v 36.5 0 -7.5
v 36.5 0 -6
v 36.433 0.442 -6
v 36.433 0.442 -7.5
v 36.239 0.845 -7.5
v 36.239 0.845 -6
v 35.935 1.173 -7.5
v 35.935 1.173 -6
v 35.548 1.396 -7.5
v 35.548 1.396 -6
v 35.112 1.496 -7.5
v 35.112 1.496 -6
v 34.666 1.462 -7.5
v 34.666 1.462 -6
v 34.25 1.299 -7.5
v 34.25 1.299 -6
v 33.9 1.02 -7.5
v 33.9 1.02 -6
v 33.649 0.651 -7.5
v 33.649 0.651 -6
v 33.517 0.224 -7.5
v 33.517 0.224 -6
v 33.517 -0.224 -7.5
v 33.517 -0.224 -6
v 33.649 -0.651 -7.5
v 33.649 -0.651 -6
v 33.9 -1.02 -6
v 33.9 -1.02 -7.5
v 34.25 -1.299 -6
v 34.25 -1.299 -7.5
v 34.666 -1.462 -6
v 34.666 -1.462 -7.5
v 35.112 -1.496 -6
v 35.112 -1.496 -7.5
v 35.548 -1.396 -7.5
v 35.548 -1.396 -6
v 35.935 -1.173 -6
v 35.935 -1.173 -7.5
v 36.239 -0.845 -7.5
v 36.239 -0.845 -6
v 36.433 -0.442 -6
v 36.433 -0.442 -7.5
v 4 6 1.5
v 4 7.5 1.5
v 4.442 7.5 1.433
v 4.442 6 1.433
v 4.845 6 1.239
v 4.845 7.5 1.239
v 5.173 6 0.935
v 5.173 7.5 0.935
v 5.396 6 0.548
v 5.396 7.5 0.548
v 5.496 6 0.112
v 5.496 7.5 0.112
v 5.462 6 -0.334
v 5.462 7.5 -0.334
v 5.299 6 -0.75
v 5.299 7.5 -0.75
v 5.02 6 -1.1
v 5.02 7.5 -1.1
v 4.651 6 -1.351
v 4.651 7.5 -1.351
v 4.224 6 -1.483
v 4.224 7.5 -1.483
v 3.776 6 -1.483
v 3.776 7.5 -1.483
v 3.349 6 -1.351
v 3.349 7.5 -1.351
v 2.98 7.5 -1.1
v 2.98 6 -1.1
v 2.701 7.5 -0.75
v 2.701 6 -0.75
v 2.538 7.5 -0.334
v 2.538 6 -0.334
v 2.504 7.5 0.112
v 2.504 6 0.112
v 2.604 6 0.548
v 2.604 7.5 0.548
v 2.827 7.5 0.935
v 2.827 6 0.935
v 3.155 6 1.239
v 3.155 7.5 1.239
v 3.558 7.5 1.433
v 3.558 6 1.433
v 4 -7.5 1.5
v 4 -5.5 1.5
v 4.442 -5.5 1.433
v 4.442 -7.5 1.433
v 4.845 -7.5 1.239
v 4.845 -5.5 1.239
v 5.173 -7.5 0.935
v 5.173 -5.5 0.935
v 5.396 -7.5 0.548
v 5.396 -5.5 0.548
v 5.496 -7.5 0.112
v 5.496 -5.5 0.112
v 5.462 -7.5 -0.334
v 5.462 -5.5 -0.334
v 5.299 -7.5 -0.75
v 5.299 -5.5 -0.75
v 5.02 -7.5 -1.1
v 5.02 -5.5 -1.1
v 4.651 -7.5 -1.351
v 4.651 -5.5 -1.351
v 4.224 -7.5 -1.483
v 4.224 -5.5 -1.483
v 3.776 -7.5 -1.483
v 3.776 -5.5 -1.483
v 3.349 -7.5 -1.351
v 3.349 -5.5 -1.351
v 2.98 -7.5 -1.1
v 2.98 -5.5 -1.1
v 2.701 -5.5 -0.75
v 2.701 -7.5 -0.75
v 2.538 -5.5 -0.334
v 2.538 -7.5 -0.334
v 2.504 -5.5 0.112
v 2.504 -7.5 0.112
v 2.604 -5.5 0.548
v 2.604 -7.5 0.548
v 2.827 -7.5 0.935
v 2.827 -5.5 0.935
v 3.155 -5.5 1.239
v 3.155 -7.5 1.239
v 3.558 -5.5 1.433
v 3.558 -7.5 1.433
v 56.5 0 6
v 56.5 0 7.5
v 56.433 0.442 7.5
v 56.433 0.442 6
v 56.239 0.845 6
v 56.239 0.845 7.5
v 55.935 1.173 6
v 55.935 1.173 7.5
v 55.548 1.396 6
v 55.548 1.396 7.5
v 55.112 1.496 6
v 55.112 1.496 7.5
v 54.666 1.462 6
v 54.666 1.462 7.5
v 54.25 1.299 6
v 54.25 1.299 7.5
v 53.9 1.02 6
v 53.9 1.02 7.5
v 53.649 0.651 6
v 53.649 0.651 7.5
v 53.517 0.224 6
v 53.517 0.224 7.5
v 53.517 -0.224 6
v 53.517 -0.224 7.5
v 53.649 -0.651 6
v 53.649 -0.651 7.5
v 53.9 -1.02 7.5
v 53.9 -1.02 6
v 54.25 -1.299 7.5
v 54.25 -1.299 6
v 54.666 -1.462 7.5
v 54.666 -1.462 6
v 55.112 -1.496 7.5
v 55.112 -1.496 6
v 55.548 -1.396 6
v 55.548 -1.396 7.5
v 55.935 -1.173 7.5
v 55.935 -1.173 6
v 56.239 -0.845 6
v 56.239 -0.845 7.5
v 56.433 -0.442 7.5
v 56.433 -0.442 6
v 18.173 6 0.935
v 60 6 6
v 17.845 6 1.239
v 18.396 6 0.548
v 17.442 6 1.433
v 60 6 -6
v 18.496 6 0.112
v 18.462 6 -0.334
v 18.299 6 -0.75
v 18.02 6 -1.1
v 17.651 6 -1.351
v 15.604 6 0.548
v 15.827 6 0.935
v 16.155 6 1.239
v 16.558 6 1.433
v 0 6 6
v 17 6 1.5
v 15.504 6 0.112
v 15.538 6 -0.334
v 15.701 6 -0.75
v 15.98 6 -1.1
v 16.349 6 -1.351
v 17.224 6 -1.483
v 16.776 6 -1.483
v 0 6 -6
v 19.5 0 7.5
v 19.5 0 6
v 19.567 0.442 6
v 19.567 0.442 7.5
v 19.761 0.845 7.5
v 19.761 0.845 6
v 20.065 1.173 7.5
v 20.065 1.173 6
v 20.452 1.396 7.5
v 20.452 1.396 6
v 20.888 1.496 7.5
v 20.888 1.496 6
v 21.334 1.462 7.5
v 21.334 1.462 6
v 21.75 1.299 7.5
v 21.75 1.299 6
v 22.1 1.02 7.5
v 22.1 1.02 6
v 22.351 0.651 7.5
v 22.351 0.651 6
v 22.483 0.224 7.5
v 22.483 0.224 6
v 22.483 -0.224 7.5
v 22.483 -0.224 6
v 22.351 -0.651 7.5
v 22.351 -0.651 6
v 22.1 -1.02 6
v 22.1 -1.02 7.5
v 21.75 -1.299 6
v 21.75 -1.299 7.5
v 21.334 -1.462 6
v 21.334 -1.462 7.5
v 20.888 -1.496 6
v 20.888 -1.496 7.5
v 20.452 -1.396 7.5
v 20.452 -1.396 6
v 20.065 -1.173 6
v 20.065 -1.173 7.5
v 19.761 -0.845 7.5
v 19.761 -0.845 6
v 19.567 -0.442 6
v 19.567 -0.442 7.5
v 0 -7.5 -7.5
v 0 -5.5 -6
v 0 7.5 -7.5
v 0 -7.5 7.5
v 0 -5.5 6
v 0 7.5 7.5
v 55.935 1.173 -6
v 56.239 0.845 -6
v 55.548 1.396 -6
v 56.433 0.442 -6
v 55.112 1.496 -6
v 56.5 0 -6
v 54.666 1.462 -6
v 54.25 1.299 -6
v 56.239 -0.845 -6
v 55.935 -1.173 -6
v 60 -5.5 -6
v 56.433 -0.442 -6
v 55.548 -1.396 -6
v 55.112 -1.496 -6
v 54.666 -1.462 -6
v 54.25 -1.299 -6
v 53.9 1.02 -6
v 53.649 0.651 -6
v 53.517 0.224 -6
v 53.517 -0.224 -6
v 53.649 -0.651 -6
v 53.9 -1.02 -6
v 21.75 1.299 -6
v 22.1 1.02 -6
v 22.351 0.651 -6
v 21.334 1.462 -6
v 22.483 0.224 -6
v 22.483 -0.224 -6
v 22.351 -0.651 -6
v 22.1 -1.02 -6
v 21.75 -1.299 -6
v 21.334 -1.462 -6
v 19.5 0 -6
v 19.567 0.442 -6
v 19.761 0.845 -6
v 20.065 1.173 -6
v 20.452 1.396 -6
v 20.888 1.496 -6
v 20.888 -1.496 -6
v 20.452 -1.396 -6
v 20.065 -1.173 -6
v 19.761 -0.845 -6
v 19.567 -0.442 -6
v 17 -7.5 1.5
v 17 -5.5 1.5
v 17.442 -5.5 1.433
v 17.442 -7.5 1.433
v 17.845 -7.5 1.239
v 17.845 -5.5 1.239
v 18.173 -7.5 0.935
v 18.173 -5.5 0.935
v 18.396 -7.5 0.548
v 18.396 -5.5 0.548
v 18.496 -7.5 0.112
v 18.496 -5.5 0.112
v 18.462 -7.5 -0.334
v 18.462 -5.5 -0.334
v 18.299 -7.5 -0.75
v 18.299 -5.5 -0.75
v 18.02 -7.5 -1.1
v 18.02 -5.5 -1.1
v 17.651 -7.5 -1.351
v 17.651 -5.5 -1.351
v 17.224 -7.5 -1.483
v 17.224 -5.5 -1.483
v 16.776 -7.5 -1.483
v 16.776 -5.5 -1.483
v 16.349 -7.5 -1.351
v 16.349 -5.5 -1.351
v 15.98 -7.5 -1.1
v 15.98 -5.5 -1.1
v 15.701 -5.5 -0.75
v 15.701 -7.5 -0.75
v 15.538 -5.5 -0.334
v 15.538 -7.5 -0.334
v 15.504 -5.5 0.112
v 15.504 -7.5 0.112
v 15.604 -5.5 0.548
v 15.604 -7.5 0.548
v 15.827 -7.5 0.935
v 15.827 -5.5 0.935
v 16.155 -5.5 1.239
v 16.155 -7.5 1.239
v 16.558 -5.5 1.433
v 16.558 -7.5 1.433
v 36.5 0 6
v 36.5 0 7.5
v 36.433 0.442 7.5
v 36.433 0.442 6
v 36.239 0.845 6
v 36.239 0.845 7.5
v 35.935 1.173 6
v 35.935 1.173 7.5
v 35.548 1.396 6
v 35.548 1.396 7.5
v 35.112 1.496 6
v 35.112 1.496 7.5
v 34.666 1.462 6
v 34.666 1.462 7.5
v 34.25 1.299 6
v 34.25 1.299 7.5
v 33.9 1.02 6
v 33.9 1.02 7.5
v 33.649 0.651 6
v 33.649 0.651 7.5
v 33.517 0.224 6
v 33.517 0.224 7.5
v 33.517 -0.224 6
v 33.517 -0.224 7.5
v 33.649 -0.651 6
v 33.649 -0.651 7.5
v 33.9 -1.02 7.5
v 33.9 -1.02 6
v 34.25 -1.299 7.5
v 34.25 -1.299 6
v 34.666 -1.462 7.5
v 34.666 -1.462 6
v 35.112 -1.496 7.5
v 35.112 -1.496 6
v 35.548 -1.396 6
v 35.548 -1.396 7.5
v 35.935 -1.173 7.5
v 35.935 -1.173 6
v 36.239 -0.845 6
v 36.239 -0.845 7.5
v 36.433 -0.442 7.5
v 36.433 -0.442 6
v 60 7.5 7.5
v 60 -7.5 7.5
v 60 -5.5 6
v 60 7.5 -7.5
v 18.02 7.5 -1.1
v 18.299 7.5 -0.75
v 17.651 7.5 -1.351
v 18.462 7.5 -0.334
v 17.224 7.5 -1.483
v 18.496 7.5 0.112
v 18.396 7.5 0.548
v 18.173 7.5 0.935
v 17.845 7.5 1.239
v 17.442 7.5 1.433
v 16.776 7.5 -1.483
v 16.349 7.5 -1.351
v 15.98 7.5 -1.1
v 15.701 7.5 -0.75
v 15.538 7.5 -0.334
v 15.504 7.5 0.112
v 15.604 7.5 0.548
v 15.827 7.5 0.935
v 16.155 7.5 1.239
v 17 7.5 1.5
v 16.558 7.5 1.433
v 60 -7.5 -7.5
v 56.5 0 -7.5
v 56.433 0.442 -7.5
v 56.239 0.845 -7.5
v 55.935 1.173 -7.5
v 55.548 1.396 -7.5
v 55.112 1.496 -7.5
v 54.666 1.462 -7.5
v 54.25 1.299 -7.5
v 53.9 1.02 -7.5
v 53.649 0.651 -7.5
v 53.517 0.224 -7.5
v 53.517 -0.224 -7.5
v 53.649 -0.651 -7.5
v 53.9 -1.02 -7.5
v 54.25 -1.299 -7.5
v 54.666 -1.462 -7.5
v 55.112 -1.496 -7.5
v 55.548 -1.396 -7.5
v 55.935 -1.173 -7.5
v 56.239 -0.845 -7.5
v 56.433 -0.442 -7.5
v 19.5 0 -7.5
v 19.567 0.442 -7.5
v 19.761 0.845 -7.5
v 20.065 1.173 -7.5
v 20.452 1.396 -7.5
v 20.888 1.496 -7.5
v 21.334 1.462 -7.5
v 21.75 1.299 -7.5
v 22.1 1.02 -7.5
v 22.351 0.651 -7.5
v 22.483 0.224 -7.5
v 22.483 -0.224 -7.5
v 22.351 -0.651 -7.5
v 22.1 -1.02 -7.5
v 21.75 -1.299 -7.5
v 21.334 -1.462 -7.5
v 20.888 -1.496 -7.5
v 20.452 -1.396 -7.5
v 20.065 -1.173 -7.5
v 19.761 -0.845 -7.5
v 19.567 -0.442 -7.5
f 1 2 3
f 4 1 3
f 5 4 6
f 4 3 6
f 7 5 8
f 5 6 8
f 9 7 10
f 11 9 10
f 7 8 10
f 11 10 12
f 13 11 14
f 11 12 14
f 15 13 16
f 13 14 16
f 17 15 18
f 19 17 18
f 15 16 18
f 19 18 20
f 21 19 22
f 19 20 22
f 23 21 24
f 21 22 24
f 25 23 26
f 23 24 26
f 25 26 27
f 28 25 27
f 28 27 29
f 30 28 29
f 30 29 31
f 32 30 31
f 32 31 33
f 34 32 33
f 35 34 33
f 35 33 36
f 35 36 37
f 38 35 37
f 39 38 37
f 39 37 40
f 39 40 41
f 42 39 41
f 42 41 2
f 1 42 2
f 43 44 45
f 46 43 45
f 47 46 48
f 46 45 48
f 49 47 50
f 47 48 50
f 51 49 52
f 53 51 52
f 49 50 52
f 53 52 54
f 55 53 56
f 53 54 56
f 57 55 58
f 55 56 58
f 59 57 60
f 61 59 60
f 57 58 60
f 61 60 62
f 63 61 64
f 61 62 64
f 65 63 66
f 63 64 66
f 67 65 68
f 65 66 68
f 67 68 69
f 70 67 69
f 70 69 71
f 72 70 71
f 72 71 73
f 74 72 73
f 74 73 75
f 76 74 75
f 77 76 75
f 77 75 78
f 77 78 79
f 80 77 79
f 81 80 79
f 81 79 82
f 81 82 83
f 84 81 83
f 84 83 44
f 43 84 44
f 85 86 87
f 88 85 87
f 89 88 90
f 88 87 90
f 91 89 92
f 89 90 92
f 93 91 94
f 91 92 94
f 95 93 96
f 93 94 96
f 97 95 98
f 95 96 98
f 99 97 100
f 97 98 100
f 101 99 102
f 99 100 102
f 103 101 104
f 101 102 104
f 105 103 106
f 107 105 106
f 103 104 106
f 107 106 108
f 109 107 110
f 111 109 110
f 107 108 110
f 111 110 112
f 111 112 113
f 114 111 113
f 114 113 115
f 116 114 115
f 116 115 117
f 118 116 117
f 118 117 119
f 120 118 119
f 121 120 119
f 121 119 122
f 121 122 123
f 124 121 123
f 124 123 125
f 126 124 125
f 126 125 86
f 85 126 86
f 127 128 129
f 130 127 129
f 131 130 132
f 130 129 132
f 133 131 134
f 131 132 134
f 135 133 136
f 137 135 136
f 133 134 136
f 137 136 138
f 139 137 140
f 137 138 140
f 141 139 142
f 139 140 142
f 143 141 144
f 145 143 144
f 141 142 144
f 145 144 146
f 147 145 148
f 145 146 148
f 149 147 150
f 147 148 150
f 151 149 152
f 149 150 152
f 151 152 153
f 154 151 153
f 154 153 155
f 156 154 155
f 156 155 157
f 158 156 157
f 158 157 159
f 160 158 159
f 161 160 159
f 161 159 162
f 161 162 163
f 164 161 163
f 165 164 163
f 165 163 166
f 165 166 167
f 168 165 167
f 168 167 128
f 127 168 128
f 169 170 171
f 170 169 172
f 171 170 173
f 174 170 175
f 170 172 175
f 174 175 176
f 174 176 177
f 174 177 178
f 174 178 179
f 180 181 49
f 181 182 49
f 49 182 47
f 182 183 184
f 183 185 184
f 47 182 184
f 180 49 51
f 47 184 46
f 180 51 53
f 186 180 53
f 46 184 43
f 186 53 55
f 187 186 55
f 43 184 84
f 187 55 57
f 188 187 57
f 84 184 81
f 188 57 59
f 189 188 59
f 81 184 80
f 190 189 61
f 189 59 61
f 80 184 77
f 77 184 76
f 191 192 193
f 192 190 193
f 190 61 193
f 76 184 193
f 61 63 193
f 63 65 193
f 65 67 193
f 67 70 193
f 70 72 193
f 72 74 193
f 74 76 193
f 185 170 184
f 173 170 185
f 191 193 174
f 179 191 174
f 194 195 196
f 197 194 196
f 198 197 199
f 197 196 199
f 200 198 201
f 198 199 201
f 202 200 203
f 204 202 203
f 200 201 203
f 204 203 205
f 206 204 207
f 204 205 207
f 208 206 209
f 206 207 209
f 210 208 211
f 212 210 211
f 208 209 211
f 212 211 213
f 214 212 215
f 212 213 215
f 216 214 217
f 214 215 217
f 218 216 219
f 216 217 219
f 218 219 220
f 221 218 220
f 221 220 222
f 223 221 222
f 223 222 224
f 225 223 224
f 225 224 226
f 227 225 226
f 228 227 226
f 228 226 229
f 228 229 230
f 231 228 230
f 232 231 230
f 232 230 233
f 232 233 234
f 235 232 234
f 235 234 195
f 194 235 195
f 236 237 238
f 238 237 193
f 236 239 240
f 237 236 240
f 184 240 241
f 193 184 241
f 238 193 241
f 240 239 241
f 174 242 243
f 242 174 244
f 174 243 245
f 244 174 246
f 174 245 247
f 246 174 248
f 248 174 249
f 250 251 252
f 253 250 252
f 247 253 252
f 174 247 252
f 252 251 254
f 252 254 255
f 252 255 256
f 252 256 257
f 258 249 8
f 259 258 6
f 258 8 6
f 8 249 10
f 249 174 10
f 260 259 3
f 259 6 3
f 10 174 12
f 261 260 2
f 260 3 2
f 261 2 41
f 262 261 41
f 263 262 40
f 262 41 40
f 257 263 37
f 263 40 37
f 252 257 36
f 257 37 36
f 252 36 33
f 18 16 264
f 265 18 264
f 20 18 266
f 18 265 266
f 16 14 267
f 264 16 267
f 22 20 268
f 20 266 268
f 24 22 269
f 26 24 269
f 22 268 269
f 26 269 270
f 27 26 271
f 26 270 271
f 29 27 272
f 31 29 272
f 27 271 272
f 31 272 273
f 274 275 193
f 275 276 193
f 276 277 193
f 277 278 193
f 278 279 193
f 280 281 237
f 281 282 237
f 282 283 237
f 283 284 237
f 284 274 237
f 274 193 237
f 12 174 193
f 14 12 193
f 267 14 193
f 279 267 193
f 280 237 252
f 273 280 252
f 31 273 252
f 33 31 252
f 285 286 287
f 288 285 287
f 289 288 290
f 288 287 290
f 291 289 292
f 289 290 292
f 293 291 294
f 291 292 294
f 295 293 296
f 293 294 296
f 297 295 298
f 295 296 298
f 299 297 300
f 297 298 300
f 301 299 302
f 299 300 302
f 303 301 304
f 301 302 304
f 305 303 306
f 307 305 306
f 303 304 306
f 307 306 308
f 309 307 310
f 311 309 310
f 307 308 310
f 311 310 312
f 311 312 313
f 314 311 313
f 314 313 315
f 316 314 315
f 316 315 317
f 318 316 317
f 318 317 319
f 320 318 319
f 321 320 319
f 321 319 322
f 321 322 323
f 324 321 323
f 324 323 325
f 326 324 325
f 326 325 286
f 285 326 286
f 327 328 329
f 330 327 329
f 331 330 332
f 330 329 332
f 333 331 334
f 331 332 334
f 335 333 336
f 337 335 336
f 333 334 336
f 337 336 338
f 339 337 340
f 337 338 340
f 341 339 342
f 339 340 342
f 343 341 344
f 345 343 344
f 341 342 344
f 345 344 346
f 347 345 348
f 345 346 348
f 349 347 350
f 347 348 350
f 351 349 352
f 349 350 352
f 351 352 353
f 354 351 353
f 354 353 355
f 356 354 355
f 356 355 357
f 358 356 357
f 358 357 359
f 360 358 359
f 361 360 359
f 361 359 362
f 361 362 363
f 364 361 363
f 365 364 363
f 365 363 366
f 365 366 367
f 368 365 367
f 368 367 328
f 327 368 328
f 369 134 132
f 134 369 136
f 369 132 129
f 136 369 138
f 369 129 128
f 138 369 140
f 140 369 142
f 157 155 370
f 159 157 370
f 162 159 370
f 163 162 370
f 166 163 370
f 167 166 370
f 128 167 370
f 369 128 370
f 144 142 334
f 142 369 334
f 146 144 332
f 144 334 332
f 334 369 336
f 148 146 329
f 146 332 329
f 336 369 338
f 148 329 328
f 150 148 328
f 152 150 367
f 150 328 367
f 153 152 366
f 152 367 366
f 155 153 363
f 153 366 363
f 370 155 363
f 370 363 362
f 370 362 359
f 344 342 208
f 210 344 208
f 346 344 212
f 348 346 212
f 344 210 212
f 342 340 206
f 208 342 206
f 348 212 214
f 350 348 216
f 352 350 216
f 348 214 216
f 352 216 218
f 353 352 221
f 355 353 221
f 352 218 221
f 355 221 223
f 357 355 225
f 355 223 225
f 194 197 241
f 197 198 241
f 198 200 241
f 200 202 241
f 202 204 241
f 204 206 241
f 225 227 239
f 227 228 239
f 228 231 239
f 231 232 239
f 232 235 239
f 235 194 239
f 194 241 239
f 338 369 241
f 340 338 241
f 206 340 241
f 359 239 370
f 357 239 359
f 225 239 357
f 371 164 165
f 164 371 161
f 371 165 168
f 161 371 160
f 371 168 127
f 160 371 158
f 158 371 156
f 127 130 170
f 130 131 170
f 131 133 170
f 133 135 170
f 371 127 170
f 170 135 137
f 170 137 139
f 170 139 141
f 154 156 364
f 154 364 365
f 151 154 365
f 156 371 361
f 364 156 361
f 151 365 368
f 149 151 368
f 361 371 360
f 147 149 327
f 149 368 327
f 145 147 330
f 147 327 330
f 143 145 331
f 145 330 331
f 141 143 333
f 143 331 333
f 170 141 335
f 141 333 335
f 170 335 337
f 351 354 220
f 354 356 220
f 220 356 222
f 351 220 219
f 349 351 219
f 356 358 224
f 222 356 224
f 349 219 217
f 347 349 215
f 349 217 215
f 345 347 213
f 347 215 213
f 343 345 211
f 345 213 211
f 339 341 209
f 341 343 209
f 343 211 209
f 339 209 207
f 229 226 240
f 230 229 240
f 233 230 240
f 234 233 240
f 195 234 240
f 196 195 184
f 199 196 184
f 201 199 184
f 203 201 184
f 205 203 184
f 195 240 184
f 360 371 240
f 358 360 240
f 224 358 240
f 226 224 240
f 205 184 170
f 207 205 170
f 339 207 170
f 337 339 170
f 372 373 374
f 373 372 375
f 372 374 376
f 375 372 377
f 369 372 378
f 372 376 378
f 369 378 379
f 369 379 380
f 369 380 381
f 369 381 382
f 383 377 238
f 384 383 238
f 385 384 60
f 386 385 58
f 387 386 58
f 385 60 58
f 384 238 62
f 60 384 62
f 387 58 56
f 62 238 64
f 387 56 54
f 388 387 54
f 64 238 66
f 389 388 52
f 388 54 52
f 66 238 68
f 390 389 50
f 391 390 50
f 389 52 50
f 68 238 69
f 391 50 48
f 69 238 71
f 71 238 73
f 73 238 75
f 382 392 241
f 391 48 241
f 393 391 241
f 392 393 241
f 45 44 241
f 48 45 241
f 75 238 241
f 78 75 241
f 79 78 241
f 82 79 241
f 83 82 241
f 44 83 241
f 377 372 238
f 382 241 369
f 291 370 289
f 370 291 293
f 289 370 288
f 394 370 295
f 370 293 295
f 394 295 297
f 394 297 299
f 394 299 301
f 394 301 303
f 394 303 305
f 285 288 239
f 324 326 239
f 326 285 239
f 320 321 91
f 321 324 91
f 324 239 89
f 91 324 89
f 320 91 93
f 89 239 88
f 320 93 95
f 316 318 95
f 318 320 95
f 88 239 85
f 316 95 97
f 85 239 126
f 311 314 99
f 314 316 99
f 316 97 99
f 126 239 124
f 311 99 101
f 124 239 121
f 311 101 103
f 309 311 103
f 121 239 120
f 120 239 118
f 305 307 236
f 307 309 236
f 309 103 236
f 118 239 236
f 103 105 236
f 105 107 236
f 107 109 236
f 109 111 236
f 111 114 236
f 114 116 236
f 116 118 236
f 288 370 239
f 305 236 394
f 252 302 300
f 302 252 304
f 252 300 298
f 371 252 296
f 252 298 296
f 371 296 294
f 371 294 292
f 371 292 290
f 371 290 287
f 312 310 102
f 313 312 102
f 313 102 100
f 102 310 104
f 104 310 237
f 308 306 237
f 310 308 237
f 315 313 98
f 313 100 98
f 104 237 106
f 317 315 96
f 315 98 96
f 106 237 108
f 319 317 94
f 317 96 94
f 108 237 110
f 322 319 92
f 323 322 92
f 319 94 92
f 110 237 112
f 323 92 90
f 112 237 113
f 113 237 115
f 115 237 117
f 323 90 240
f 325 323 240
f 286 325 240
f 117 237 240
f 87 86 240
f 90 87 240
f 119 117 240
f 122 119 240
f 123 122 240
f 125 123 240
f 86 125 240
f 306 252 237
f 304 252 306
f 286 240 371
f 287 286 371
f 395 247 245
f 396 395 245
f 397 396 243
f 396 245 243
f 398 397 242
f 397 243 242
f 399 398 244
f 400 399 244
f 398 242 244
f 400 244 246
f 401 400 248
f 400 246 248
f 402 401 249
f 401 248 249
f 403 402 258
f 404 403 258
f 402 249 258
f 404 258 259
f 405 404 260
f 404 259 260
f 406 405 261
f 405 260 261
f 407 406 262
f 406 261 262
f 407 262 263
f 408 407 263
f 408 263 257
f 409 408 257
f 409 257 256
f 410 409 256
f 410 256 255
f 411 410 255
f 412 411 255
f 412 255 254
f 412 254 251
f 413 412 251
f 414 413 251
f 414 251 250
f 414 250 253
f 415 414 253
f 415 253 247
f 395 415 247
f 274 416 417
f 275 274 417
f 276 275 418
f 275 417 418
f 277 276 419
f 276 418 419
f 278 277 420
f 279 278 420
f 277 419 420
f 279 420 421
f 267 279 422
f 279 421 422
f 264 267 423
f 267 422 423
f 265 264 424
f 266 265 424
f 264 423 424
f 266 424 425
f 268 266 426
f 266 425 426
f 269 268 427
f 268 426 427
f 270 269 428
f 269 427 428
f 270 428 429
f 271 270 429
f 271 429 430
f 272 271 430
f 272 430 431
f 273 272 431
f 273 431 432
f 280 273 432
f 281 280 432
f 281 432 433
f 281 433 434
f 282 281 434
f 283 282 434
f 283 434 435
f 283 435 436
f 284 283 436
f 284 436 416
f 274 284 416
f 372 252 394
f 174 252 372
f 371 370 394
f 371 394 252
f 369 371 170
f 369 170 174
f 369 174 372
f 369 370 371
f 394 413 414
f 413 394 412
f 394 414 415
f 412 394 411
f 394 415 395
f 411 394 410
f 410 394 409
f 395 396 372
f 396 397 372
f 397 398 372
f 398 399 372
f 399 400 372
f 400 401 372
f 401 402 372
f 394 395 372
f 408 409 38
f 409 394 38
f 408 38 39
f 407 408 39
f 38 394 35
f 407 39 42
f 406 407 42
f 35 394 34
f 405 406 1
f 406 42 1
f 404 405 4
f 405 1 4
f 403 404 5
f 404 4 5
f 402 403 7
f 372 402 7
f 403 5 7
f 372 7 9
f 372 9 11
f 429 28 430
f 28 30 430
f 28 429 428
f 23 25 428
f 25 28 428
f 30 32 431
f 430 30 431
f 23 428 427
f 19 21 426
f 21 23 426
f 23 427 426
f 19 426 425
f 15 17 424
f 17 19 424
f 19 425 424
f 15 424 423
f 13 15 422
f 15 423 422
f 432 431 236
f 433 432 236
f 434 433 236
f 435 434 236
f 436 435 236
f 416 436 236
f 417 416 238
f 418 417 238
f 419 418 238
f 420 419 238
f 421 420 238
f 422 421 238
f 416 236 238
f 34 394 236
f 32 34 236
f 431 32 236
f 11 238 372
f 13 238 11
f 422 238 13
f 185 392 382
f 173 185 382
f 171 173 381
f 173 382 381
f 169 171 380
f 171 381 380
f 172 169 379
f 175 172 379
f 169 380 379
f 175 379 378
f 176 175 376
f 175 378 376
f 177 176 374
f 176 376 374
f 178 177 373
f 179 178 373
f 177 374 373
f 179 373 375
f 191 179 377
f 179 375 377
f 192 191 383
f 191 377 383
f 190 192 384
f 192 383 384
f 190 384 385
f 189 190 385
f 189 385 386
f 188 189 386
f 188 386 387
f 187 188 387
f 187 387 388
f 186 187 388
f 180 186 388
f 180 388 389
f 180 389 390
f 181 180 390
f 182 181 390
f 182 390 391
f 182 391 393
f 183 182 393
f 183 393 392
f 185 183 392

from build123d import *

# Parameters (mm, degrees)
MEMBER_15_15_1_5_1_DEPTH = 60
SKETCH_3_R               = 1.5
CUT_EXTRUDE_1_DEPTH      = 63.299678972
SKETCH_5_R               = 1.5
CUT_EXTRUDE_2_DEPTH      = 63.299678972
SKETCH_6_R               = 1.5
CUT_EXTRUDE_3_DEPTH      = 63.299678972


with BuildPart() as part:
    # Sketch1 → Member 15 _15_ 1.5_1 (new body)
    with BuildSketch(Plane.YZ):
        Polygon((-6, -7.5), (6, -7.5), (7.5, -7.5), (7.5, -6), (7.5, 6), (7.5, 7.5), (6, 7.5), (-6, 7.5), (-7.5, 7.5), (-7.5, 6), (-7.5, -6), (-7.5, -7.5), align=None)
        Polygon((-4, -6), (4, -6), (6, -6), (6, -3.5), (6, 3.5), (6, 6), (3.5, 6), (-3.5, 6), (-5.5, 6), (-5.5, 3.5), (-5.5, -3.5), (-5.5, -6), align=None, mode=Mode.SUBTRACT)
    extrude(amount=MEMBER_15_15_1_5_1_DEPTH)

    # 草图3 → 切除-拉伸1 (cut, through all)
    with BuildSketch(Plane(origin=(0, 7.5, 0), x_dir=(1, 0, 0), z_dir=(0, 1, 0))):
        with Locations(Location((17, 0, 0), (0, 0, 270))):
            Circle(SKETCH_3_R)
        with Locations(Location((4, 0, 0), (0, 0, 270))):
            Circle(SKETCH_3_R)
    extrude(amount=-CUT_EXTRUDE_1_DEPTH, mode=Mode.SUBTRACT)

    # 草图5 → 切除-拉伸2 (cut, through all)
    with BuildSketch(Plane.XY.offset(7.5)):
        with Locations((55, 0)):
            Circle(SKETCH_5_R)
        with Locations((35, 0)):
            Circle(SKETCH_5_R)
    extrude(amount=-CUT_EXTRUDE_2_DEPTH, mode=Mode.SUBTRACT)

    # 草图6 → 切除-拉伸3 (cut, through all)
    with BuildSketch(Plane(origin=(0, 0, -7.5), x_dir=(-1, 0, 0), z_dir=(0, 0, -1))):
        with Locations((-21, 0)):
            Circle(SKETCH_6_R)
    extrude(amount=-CUT_EXTRUDE_3_DEPTH, mode=Mode.SUBTRACT)


solid = part.part
